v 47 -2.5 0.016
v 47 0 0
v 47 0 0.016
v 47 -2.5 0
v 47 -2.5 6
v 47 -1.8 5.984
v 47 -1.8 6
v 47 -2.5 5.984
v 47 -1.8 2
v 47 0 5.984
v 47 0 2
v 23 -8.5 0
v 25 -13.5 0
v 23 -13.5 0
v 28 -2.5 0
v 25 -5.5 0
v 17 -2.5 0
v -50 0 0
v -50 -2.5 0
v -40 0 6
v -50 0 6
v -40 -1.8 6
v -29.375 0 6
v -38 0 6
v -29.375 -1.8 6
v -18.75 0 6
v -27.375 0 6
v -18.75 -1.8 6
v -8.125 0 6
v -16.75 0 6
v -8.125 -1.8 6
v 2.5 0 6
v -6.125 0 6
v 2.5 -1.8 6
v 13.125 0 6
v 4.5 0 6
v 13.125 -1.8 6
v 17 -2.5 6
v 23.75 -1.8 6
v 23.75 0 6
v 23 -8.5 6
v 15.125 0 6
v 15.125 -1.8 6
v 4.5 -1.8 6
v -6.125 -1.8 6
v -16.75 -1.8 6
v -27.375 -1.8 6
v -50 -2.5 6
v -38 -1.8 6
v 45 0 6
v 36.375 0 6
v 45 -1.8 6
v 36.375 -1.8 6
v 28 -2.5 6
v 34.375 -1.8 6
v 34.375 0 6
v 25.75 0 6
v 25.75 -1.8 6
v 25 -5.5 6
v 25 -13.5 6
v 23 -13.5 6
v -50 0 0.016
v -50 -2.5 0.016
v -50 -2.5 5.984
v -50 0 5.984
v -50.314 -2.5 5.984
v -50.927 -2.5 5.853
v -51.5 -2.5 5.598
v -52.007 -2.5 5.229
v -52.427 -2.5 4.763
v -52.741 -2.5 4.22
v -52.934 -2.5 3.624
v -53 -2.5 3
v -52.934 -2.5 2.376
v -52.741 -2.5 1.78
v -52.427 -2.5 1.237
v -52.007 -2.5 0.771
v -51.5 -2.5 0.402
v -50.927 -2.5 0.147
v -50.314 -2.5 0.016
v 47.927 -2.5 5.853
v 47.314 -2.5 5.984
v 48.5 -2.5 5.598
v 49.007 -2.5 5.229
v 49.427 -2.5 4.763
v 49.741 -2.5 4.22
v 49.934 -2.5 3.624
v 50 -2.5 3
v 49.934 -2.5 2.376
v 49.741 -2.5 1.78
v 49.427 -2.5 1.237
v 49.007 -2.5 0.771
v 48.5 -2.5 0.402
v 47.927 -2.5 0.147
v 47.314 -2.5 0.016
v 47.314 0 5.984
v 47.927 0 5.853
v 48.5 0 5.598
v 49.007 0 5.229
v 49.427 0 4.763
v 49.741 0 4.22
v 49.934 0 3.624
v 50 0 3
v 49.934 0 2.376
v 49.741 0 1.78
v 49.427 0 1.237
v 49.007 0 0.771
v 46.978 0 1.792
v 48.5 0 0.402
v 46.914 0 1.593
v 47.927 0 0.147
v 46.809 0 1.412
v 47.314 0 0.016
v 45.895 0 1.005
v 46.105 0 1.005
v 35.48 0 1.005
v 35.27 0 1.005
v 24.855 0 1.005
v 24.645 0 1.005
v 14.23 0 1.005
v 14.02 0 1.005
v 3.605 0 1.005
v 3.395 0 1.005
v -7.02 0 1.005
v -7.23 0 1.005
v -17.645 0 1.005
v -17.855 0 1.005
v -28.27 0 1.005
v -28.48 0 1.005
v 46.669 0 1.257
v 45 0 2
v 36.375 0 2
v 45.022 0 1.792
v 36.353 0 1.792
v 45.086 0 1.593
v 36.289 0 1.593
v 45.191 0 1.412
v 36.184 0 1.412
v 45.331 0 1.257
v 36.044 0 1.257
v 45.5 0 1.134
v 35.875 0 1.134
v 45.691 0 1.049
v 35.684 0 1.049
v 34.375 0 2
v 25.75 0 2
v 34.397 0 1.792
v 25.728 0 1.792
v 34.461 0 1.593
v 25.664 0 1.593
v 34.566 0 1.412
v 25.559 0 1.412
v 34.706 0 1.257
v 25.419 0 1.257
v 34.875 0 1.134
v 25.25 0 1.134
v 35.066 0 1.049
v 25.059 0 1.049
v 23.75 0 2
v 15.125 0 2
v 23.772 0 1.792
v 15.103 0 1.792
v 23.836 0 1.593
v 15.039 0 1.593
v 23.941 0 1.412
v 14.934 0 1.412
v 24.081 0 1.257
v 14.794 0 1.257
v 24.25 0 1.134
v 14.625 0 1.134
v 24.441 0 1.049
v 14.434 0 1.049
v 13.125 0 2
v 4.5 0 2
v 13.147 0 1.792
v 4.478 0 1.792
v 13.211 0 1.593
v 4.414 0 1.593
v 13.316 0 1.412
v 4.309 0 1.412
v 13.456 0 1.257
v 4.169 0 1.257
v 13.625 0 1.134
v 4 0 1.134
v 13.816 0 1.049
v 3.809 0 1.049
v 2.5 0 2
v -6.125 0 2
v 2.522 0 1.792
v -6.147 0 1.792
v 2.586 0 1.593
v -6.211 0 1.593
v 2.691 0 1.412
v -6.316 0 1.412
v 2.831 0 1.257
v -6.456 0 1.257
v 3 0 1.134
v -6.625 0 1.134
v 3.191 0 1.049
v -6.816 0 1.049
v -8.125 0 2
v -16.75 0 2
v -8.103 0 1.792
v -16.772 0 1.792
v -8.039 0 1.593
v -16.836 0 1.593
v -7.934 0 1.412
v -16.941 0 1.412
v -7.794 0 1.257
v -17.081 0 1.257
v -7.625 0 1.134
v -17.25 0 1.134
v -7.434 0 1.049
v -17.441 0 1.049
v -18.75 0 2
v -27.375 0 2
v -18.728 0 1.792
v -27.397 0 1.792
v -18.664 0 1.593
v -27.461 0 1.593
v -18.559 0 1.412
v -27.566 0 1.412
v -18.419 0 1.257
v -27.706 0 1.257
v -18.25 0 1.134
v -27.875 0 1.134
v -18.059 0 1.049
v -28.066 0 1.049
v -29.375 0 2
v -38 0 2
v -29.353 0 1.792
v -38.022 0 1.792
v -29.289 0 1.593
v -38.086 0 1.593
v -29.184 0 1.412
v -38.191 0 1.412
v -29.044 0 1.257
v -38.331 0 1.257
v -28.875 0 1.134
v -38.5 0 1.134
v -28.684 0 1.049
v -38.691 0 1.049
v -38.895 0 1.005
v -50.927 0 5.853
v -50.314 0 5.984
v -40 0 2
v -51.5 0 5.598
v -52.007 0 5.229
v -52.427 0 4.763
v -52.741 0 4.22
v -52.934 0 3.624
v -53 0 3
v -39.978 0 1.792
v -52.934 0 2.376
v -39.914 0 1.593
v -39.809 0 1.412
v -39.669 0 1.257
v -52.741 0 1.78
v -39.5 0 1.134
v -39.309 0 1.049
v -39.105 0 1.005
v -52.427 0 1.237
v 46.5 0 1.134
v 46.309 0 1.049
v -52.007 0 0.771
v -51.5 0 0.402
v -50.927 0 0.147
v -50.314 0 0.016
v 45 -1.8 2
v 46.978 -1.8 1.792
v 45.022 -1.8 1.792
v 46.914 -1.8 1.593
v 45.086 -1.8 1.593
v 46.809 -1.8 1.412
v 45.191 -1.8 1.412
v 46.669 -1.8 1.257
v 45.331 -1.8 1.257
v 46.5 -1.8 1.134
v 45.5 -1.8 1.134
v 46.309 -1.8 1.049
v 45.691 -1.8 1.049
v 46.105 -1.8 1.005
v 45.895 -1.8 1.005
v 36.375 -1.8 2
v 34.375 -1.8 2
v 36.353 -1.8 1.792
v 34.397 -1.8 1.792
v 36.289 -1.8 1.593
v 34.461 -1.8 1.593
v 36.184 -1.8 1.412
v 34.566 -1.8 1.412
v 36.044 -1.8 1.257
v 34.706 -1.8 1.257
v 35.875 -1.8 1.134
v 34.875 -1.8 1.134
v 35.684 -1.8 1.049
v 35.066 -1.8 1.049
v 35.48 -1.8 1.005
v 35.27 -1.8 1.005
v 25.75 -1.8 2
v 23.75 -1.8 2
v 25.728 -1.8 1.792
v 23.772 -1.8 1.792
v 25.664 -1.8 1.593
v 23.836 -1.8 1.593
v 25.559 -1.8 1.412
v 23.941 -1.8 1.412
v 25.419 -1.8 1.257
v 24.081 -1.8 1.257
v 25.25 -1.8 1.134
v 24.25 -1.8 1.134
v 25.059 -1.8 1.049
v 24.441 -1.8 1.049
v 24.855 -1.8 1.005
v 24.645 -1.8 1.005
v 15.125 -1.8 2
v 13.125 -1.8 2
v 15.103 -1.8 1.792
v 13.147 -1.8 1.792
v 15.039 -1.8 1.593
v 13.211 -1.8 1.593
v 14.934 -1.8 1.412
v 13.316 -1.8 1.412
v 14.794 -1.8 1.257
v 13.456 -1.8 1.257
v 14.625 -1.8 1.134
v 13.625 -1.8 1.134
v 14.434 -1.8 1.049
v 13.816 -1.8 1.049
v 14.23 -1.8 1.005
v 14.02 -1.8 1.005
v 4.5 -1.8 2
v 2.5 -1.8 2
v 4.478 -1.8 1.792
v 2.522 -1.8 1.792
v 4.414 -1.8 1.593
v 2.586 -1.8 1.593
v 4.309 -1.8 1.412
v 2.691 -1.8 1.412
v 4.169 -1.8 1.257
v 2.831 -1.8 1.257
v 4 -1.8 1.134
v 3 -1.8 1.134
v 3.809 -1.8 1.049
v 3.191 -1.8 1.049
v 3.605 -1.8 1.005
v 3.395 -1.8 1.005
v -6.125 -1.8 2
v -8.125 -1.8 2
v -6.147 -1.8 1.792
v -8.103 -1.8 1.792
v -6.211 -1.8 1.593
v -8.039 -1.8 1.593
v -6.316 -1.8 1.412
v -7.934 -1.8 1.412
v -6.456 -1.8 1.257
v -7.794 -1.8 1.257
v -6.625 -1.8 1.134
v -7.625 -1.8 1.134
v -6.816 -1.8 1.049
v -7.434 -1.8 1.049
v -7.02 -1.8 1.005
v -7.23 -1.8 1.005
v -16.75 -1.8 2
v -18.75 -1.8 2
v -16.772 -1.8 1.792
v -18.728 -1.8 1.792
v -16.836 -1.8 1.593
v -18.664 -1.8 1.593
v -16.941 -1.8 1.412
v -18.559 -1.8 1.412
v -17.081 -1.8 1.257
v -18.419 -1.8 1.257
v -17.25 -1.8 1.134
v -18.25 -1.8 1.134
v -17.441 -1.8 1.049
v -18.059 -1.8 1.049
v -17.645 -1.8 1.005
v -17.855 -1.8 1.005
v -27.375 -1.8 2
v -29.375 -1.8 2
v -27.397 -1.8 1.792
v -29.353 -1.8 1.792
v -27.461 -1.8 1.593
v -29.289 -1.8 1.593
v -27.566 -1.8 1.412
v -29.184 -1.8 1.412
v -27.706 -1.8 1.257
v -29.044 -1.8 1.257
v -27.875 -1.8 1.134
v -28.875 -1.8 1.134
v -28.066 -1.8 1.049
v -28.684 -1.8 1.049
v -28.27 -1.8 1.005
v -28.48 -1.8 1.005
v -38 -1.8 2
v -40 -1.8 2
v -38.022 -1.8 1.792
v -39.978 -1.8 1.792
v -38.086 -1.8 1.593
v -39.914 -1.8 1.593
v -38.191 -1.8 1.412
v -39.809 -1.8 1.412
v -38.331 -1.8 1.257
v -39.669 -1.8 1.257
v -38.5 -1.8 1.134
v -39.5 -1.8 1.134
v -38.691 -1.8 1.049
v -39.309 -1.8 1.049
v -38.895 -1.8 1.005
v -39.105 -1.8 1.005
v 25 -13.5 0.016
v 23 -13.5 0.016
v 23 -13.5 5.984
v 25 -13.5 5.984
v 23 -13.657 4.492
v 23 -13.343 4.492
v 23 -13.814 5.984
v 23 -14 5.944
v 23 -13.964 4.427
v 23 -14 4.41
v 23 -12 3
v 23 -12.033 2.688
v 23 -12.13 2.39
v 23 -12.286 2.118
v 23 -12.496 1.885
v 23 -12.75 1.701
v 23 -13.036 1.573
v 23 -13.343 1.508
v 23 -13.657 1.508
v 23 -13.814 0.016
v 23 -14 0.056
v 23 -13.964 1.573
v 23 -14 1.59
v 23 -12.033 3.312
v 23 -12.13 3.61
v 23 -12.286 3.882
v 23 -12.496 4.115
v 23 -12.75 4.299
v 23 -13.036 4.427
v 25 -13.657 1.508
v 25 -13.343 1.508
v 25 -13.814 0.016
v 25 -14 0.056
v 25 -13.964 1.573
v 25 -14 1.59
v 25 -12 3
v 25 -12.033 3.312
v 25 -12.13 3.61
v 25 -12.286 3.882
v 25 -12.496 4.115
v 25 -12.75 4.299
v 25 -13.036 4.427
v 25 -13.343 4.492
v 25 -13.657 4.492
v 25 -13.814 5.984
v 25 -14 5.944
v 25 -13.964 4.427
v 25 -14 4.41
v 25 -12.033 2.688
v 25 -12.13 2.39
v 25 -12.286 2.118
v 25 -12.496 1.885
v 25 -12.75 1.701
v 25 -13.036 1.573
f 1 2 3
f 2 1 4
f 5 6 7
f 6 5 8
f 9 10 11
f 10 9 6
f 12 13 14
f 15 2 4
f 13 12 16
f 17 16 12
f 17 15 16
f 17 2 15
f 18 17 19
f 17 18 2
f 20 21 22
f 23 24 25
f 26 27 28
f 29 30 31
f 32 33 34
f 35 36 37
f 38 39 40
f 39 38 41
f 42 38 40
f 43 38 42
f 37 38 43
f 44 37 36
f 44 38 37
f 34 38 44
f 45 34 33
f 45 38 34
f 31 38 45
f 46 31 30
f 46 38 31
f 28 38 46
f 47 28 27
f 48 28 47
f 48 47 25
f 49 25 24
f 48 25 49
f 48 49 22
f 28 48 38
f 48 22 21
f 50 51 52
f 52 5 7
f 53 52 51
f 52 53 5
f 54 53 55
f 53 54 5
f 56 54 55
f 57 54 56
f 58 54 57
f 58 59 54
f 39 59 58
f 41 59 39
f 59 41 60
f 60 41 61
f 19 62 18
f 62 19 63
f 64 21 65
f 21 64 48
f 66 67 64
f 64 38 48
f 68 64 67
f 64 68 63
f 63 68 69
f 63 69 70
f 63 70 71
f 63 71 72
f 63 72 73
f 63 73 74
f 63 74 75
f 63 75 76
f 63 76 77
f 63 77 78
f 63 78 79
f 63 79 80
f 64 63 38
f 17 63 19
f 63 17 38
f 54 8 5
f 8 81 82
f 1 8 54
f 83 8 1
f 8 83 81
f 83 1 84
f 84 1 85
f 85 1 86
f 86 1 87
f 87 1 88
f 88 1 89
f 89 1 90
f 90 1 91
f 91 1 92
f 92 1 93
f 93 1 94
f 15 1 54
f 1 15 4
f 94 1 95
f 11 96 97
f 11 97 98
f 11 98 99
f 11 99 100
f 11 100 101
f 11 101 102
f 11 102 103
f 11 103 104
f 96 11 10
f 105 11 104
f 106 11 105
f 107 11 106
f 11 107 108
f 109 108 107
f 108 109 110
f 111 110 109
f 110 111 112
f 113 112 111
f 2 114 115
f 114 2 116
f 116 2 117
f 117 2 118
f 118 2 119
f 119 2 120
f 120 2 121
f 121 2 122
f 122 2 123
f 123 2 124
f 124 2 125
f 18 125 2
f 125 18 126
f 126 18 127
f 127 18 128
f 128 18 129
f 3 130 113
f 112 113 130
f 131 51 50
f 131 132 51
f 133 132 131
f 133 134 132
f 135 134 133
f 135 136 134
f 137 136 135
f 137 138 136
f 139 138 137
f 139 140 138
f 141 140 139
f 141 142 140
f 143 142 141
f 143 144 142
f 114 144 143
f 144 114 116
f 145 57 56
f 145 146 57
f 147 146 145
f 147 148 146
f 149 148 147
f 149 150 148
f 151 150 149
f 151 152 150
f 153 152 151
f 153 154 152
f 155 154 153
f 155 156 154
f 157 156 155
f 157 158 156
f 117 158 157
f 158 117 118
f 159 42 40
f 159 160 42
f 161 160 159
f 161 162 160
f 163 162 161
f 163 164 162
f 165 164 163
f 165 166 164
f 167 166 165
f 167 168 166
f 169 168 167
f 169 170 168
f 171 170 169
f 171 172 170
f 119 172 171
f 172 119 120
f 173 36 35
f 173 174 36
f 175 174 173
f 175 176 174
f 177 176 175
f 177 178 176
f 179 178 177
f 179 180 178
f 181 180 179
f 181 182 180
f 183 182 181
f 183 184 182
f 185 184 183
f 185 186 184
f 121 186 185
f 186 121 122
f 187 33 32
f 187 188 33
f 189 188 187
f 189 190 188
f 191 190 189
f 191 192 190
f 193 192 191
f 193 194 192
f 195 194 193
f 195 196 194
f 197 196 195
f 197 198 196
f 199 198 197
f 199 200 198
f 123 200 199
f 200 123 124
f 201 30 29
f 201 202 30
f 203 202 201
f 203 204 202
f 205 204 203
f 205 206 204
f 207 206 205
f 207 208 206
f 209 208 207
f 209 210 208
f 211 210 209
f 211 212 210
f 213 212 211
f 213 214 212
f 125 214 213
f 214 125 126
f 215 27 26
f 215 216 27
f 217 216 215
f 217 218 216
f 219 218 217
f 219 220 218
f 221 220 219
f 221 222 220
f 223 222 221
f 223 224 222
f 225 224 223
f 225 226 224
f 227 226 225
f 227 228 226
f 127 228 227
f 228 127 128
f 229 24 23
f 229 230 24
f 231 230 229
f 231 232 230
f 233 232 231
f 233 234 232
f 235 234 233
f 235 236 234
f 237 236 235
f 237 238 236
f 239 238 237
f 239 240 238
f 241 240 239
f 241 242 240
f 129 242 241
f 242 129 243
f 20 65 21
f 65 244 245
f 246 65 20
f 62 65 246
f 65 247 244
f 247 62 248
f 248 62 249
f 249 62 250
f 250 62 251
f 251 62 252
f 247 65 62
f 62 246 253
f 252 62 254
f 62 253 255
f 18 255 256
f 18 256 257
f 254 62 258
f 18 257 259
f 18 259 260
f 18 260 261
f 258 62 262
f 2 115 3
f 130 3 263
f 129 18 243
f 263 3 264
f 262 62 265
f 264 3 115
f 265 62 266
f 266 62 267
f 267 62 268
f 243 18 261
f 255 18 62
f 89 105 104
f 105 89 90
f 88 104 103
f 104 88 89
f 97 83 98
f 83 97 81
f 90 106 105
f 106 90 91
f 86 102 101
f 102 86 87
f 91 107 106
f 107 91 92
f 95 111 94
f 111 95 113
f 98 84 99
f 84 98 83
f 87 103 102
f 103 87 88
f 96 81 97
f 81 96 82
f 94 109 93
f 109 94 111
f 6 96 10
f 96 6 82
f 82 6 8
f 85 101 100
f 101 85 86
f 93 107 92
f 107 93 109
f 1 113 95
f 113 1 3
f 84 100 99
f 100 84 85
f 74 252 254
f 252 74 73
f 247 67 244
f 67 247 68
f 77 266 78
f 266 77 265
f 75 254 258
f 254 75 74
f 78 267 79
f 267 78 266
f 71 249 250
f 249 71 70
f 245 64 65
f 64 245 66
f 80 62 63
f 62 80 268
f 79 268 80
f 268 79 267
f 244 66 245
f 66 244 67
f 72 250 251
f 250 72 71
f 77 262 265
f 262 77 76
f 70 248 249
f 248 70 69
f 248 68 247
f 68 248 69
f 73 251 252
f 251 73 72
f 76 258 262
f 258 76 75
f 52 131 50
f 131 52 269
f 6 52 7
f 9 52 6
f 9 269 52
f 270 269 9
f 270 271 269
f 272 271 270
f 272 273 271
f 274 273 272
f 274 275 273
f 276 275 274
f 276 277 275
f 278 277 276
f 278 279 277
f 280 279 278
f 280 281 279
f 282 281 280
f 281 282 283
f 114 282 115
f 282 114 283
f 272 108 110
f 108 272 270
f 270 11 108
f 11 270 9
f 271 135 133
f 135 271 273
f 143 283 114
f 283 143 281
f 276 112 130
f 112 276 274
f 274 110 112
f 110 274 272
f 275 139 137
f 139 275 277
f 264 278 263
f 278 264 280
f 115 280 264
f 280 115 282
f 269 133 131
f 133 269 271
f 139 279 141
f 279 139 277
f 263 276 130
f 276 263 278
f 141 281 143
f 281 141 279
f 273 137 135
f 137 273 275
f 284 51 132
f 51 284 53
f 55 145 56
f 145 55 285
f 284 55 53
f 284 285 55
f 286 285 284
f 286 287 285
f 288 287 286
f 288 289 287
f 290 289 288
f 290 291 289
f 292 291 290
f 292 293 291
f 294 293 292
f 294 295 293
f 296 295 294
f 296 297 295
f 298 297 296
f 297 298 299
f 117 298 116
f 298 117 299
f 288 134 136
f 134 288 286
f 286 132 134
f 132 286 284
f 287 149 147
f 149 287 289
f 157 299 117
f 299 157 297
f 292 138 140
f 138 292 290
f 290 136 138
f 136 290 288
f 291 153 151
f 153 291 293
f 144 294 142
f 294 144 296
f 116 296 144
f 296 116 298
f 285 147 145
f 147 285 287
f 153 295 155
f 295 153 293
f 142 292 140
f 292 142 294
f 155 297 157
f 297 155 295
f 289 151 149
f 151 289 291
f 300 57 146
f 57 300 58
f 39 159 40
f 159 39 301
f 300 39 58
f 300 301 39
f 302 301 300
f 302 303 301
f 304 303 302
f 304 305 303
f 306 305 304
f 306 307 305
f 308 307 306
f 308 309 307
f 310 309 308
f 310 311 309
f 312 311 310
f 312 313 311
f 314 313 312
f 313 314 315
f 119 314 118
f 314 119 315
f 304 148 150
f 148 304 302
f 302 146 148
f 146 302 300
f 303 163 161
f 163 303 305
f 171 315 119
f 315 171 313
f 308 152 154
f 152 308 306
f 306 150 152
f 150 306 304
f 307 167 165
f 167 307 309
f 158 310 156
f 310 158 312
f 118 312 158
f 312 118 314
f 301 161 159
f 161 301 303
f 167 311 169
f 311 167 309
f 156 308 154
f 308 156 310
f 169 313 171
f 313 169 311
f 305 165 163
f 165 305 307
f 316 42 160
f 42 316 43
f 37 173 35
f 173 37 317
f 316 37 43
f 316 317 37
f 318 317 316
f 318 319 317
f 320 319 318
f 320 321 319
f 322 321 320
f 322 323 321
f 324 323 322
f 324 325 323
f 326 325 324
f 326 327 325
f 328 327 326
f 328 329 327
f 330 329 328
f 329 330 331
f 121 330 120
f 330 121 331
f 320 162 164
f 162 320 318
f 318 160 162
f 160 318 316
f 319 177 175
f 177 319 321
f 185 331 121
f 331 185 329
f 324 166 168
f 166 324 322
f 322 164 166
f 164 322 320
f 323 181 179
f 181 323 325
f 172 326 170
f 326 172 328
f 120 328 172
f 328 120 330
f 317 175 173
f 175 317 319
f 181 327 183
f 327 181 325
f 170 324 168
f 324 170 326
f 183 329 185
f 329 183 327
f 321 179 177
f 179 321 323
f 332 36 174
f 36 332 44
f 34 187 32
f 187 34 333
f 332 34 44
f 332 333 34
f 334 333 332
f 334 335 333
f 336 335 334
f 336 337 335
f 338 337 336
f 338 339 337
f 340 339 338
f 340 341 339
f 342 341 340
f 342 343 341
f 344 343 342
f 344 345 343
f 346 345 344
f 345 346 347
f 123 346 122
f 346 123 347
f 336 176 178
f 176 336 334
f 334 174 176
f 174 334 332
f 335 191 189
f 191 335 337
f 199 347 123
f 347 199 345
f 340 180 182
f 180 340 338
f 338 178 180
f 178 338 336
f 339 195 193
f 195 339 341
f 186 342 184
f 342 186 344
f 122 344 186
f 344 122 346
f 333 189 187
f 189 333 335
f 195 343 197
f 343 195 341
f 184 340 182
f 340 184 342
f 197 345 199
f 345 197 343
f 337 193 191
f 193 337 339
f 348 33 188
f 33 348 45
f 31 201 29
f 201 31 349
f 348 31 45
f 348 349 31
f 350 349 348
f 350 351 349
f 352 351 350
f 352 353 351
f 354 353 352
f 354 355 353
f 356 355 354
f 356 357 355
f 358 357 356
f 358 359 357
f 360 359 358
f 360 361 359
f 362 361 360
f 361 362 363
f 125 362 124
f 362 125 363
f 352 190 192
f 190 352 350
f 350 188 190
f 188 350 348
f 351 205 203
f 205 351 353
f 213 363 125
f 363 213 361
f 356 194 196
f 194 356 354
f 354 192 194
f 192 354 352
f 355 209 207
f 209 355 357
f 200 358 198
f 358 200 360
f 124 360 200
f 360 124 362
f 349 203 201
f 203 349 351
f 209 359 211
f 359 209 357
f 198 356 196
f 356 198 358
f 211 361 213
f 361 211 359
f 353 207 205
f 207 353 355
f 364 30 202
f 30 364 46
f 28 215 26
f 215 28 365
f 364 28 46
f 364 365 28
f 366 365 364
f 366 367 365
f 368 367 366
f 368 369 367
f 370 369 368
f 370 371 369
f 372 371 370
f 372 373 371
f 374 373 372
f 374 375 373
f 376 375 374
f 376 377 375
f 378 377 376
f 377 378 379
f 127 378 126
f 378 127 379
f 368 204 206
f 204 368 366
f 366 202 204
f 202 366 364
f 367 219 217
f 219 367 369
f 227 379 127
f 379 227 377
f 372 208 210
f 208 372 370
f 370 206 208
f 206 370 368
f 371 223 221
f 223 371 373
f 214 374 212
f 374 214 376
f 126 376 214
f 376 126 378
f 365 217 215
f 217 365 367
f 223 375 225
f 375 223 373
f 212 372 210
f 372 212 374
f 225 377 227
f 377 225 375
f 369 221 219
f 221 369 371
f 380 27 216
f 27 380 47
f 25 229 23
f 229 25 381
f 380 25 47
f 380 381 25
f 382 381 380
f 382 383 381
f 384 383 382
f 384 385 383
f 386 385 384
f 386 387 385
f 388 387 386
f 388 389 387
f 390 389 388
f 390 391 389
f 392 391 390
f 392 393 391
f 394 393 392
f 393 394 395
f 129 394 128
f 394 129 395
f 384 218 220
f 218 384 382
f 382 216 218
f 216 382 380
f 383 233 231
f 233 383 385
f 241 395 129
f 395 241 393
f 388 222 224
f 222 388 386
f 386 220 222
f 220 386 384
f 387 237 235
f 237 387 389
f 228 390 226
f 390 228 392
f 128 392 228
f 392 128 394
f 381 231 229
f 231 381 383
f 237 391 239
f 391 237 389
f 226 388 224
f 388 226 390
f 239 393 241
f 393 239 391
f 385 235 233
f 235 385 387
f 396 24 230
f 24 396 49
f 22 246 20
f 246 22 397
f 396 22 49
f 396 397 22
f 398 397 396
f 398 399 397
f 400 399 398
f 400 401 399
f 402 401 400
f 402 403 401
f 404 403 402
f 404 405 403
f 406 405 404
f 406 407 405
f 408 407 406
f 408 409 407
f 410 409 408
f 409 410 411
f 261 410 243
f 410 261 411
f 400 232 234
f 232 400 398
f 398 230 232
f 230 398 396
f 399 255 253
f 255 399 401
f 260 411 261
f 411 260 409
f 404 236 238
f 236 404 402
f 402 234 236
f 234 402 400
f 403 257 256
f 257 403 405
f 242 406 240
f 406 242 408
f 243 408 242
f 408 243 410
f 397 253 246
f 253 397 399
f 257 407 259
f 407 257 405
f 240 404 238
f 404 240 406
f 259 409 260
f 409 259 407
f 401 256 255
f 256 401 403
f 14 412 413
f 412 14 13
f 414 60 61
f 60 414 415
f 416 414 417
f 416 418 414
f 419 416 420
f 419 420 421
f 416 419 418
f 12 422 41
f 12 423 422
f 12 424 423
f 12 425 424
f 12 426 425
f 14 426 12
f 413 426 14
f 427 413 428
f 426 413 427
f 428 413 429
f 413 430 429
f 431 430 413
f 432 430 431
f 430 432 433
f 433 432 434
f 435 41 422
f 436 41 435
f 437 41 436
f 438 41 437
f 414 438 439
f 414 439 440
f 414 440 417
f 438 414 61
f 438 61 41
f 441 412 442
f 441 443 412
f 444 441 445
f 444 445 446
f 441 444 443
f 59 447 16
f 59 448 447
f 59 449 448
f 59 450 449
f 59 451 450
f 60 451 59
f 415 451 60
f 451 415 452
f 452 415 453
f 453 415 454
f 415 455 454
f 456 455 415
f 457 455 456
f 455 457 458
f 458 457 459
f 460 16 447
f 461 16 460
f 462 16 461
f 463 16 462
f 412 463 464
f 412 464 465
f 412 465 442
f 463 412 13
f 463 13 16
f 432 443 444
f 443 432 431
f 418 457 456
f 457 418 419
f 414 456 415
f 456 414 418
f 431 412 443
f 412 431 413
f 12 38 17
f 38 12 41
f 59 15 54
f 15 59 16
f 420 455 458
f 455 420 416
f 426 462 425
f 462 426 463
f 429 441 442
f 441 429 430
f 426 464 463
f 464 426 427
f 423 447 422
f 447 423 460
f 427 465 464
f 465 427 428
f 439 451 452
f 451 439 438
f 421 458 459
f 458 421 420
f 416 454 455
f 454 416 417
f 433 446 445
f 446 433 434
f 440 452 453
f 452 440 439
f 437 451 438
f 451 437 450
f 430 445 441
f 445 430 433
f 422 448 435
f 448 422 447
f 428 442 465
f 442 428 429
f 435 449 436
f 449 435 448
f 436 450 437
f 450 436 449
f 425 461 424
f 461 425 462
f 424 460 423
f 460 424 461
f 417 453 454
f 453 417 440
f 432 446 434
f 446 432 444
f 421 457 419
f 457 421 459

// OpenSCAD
module base_body(length, width, height) {
    union() {
        cube([length,width,height]);
        translate([length, width, height/2]) 
            rotate([90,0,0])
                cylinder(width, d1=height, d2=height);
        translate([0, width, height/2]) 
            rotate([90,0,0])
                cylinder(width, d1=height, d2=height);
    }
}

module teeth(count, pitch, offset, height, width, depth) {
    for (i = [0:count-1]) {
        translate([0 - i * pitch, -depth, -1]) 
            union() {
                cube([width, depth*2, 1 + height - width/2]);
                translate([width/2, depth*2, 1 + height - width/2])
                    rotate([90,0,0])
                        cylinder(depth*2, d1=width, d2=width);
            }
    }
}

module prism(l,w,h) {
    polyhedron(
        points=[[0,0,0], [l,0,0], [l,w,0], [0,w,0], [0,w,h], [l,w,h]],
        faces=[[0,1,2,3],[5,4,3,2],[0,4,5,1],[0,3,4],[5,2,1]]
    );
}

module lever(length, width, height, hole_d, prism_size = 6) {
    difference() {
        union() {
            cube([length, width, height]);
            translate([length, width, height/2])
                rotate([90,0,0])
                    cylinder(width, d1=height, d2=height);
            // supporting prism, behind the thing
            translate([0,width+prism_size,0])
                rotate([0,90,0])
                    rotate([0,0,180])
                        prism(height, prism_size, prism_size);
            translate([0,-prism_size/2,height])
                rotate([0,90,0])
                        prism(height, prism_size/2, prism_size/2);
            
        };
        
        translate([length, width*2, height/2])
                rotate([90,0,0])
                    cylinder(width*4, d1=hole_d, d2=hole_d);
        
        translate([length + hole_d/6, -width/2, 0])
                cube([height, width*2, height]);
    }
}

module duct_lever() {
    // tesselation settings (0.01 mm is fine enough)
    $fs = 0.01;
    
    length = 97;
    width  = 2.5;
    height = 6;
    rounded_end = height/2;
    
    // first tooth is the rightmost one
    // left side of it is 5 mm distant from the total end 
    // of the body
    // body is 106 mm long, but the end is at 106 - 3 
    // (leftmost curvature is below origin)
    tooth_cnt    = 9;
    tooth_offset = 5.0;
    leftmost_tooth = 10;
    
    // X coord of rightmost tooth's start
    rightmost_tooth = length + rounded_end - tooth_offset;
    
    
    // pitch is calculated here, we know the leftmost tooth
    // ends 10 mm away from the origin
    // there's (tooth_cnt - 1) spacers
    // and they occupy (rightmost_tooth - leftmost_tooth)
    tooth_pitch  = (rightmost_tooth - leftmost_tooth)/(tooth_cnt - 1);
     
    tooth_height = 5;
    tooth_width  = 2;
    tooth_depth  = 1.8;
    
    lever_offset = length + rounded_end - 25;
    lever_length = 11;
    lever_width  = 2;
    lever_hole_d = 3;
    
    
    union() {
        difference() {
            // base volume is $length plus round endings
            base_body(length, width, height);
            // subtract the teeth
            translate([rightmost_tooth, 0, 0])
                teeth(tooth_cnt, tooth_pitch, tooth_offset,
                    tooth_height, tooth_width, tooth_depth);
    }   
    
        // push lever part
        translate([lever_offset, width, 0])
            rotate([0,0,90])
                lever(lever_length, lever_width, height, 
                      lever_hole_d, prism_size = 6);
    }   
}

translate([-50,0,6])
    rotate([180,0,0])
        duct_lever();
